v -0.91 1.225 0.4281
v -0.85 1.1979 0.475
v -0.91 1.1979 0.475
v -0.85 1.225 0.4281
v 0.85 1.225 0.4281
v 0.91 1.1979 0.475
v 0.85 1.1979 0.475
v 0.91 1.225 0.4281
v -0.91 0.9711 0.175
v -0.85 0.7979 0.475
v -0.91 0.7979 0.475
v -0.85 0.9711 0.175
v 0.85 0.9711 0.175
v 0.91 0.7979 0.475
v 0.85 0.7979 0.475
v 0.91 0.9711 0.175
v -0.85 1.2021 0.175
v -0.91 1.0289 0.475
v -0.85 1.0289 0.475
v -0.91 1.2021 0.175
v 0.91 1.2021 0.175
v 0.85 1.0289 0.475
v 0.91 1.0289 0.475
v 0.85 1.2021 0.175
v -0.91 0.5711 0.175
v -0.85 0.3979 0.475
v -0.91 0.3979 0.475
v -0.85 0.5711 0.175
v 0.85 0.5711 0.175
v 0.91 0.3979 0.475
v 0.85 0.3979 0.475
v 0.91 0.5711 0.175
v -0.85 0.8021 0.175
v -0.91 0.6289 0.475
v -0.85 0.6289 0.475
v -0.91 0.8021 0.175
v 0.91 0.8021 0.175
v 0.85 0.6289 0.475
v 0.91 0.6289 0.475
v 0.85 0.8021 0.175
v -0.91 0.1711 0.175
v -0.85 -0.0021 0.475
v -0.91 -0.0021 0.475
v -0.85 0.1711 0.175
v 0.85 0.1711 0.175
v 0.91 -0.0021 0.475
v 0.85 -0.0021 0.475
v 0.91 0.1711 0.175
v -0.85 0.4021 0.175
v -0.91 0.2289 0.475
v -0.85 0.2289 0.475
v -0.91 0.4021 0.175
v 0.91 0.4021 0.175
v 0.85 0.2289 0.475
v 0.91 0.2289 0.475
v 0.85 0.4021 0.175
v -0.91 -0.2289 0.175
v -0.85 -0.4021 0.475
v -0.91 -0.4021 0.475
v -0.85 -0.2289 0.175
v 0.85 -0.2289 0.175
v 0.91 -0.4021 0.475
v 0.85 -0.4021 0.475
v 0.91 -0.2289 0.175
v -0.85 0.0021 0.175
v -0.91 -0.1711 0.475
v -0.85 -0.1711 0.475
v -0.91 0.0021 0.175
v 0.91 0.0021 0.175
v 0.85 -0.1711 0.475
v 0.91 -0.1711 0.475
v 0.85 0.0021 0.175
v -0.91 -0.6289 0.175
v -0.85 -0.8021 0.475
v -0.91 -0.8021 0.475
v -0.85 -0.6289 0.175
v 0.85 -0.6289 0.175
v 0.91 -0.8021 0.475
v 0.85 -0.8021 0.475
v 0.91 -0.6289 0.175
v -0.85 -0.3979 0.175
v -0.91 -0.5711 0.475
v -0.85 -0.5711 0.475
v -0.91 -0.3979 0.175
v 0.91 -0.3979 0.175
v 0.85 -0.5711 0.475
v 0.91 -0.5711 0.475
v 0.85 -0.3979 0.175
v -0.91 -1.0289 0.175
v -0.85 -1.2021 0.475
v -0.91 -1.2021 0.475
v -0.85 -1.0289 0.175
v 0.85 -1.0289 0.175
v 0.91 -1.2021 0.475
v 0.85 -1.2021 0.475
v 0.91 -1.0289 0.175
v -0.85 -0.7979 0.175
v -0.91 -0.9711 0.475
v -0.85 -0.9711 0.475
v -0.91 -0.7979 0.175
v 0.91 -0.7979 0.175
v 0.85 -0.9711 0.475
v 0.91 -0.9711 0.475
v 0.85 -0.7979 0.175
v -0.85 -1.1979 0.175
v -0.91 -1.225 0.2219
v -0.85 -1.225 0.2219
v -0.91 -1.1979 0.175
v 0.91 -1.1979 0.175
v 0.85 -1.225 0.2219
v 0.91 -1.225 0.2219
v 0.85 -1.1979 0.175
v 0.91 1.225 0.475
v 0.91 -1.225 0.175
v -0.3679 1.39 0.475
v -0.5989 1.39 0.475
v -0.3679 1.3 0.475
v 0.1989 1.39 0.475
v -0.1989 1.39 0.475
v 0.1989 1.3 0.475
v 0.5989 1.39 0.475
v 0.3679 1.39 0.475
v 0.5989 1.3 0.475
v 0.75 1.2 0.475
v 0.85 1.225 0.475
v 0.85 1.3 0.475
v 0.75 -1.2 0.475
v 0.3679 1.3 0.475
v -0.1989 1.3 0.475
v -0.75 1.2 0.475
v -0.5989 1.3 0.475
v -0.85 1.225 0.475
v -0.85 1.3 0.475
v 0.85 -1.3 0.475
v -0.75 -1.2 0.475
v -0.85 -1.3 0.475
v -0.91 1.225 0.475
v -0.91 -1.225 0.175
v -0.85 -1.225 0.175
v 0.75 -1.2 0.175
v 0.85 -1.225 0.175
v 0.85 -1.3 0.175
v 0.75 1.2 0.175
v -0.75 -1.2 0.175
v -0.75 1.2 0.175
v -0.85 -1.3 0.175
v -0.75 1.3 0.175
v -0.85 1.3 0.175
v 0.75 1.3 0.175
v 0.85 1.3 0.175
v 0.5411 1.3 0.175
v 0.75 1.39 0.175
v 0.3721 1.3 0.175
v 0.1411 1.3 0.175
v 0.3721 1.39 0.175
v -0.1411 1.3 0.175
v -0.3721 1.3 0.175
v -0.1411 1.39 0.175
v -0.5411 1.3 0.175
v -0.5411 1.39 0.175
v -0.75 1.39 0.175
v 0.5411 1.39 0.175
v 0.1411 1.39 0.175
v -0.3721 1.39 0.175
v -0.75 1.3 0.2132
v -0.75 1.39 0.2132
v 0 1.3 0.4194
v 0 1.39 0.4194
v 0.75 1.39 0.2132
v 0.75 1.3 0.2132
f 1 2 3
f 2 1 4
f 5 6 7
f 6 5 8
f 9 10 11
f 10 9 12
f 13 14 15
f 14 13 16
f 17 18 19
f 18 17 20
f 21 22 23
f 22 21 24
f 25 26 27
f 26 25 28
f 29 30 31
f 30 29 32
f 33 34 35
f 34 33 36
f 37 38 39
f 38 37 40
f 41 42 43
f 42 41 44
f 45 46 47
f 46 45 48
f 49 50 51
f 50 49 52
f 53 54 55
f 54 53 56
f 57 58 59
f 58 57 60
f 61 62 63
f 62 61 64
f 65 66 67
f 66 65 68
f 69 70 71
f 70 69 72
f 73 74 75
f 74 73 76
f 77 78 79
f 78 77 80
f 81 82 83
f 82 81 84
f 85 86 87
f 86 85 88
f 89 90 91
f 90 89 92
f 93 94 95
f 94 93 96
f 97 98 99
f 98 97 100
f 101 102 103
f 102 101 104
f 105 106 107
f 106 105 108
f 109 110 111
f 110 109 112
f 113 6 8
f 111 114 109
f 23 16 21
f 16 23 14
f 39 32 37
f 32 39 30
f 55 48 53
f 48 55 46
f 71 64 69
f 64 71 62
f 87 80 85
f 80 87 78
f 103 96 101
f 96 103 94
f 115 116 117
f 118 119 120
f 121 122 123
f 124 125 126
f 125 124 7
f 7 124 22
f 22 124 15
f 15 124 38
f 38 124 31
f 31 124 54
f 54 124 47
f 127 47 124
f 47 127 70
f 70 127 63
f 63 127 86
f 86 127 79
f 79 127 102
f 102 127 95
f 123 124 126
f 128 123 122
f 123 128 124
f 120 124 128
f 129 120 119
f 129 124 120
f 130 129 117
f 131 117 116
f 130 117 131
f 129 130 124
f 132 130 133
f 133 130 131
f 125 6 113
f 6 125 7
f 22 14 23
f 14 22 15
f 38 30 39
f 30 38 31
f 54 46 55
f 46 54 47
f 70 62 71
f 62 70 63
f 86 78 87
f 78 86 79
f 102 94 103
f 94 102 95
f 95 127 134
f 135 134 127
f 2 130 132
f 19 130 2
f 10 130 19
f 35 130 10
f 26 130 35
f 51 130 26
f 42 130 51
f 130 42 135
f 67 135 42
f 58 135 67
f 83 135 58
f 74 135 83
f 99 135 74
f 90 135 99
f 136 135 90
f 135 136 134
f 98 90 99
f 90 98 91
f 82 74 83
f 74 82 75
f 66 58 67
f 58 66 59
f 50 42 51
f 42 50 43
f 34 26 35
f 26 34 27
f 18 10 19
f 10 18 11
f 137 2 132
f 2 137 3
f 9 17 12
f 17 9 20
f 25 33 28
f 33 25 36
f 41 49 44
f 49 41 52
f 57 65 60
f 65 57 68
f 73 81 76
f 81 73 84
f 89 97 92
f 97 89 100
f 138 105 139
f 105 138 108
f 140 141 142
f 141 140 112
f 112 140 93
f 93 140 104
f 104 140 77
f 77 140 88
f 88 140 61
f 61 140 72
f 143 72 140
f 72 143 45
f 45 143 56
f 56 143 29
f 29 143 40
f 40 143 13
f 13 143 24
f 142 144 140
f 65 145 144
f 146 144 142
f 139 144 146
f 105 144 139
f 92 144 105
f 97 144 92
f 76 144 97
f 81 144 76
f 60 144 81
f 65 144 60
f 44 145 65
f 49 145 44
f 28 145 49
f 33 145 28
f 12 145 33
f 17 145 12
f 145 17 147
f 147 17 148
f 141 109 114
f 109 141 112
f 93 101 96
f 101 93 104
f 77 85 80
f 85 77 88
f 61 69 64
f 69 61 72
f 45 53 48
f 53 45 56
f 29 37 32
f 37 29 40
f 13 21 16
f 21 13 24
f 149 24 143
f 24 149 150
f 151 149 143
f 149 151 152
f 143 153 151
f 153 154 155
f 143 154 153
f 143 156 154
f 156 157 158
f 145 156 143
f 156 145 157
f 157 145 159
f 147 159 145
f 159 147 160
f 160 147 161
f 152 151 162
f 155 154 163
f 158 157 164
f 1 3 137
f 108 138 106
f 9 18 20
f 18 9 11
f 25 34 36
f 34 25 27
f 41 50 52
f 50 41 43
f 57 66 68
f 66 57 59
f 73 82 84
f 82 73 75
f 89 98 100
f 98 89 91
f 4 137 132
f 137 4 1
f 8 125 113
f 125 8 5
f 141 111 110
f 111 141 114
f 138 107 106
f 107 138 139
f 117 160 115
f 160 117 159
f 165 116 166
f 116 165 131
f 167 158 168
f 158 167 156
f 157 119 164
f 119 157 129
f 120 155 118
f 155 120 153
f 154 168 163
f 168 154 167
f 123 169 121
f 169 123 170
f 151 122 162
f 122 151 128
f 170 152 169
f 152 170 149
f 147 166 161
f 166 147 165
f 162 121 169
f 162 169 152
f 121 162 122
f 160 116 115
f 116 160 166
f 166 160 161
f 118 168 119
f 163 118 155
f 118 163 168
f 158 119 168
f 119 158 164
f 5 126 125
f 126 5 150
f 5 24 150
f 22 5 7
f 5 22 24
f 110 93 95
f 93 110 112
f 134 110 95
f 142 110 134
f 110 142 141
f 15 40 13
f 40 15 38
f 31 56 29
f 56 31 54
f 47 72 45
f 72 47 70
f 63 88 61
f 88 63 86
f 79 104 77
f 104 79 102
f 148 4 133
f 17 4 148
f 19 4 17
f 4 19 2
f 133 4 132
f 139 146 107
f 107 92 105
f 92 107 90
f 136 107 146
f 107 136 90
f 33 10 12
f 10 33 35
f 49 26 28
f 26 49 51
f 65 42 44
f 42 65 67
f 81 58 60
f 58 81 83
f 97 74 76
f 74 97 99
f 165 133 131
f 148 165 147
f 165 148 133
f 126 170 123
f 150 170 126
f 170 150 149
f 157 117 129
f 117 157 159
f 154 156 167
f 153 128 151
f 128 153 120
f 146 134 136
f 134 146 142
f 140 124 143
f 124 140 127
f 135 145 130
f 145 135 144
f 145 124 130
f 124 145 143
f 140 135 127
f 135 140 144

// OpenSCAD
use <lib.scad>

bounds = [2,3,2];
body = [1.8, 2.75, 1.2];

module chassisEngineerHD() {
	difference() {
		union() {
			rbox(body, 0.05, $fn=8);
			translate([0,0,-0.4]) rbox([x(body)*0.5, y(body)*0.8, z(body)], 0.05, $fn=8);
			translate([0,-1,0.45]) cyl(0.3, 0.3, 0.5, $fn=16);
		};
	};
}

module chassisEngineerLD() {
	difference() {
		union() {
			box(body);
			translate([0,0,-0.4]) box([x(body)*0.5, y(body)*0.8, z(body)]);
			translate([0,-1,0.45]) cyl(0.3, 0.3, 0.5, $fn=8);
		}
	}
}

module chassisEngineerVLD() {
	difference() {
		union() {
			box(body);
		};
	};
}

module cabHD() {
	translate([0,-1,0.45]) difference() {
		rbox([1.5,1,0.5], 0.05, $fn=8);
		cyl(0.3, 0.3, 1.0, $fn=16);
	}
}

module cabLD() {
	translate([0,-1,0.45]) difference() {
		box([1.5,1,0.5]);
		cyl(0.3, 0.3, 1.0, $fn=8);
	}
}

module chassisHaulerHD() {
	difference() {
		union() {
			rbox(body, 0.05, $fn=8);
			translate([0,0,-0.4]) rbox([x(body)*0.5, y(body)*0.8, z(body)], 0.05, $fn=8);
			translate([0,-1,0.45]) cyl(0.3, 0.3, 0.5, $fn=16);
		};
		translate([0,0.45,0.8]) rbox([1.5, 1.5, 1.0], 0.05, $fn=8);
	};
}

module chassisHaulerLD() {
	difference() {
		union() {
			box(body);
			translate([0,0,-0.4]) box([x(body)*0.5, y(body)*0.8, z(body)]);
			translate([0,-1,0.45]) cyl(0.3, 0.3, 0.5, $fn=8);
		};
		translate([0,0.45,0.8]) box([1.5, 1.5, 1.0]);
	};
}

module chassisHaulerVLD() {
	difference() {
		union() {
			box(body);
		};
	};
}

module engineerStripeHD() {
	v = 0.325;
	difference() {
		union() {
			translate([0,0,v]) box([1.7,2.6,0.3]);
			intersection() {
				translate([0,0,v]) box([1.82,2.45,0.3]);
				for (y = [2.1:-0.2:-2]) translate([0,y,v]) rotate([30,0,0]) box([2,0.1,0.5]);
			}
			intersection() {
				translate([0,0.14,v]) box([1.5,2.5,0.3]);
				union() {
					for (x = [-0.69:0.2:0]) translate([x,0,v]) rotate([0,30,0]) box([0.1,2.9,0.5]);
					for (x = [0.09:0.2:0.78]) translate([x,0,v]) rotate([0,-30,0]) box([0.1,2.9,0.5]);
				}
			}
		}
		translate([0,0,v]) box([1.5,2.4,0.4]);
	}
}

module engineerStripeLD() {
	v = 0.325;
	difference() {
		union() {
			translate([0,0,v]) box([1.7,2.6,0.3]);
			intersection() {
				translate([0,0,v]) box([1.82,2.45,0.3]);
				for (y = [2.2:-0.4:-2]) translate([0,y,v]) rotate([30,0,0]) box([2,0.2,0.5]);
			}
			intersection() {
				translate([0,0.14,v]) box([1.5,2.5,0.3]);
				union() {
					for (x = [-0.97:0.4:0]) translate([x,0,v]) rotate([0,30,0]) box([0.2,2.9,0.5]);
					for (x = [0.17:0.4:0.78]) translate([x,0,v]) rotate([0,-30,0]) box([0.2,2.9,0.5]);
				}
			}
		}
		translate([0,0,v]) box([1.5,2.4,0.4]);
	}
}

module wheel() {
	rotate([0,90,0]) cyl(0.25, 0.25, 0.35, $fn=24);
}

//cabHD();
//cabLD();
//chassisEngineerHD();
//engineerStripeHD();
engineerStripeLD();
//chassisEngineerLD();
//chassisHaulerHD();
//chassisHaulerLD();
//wheel();
